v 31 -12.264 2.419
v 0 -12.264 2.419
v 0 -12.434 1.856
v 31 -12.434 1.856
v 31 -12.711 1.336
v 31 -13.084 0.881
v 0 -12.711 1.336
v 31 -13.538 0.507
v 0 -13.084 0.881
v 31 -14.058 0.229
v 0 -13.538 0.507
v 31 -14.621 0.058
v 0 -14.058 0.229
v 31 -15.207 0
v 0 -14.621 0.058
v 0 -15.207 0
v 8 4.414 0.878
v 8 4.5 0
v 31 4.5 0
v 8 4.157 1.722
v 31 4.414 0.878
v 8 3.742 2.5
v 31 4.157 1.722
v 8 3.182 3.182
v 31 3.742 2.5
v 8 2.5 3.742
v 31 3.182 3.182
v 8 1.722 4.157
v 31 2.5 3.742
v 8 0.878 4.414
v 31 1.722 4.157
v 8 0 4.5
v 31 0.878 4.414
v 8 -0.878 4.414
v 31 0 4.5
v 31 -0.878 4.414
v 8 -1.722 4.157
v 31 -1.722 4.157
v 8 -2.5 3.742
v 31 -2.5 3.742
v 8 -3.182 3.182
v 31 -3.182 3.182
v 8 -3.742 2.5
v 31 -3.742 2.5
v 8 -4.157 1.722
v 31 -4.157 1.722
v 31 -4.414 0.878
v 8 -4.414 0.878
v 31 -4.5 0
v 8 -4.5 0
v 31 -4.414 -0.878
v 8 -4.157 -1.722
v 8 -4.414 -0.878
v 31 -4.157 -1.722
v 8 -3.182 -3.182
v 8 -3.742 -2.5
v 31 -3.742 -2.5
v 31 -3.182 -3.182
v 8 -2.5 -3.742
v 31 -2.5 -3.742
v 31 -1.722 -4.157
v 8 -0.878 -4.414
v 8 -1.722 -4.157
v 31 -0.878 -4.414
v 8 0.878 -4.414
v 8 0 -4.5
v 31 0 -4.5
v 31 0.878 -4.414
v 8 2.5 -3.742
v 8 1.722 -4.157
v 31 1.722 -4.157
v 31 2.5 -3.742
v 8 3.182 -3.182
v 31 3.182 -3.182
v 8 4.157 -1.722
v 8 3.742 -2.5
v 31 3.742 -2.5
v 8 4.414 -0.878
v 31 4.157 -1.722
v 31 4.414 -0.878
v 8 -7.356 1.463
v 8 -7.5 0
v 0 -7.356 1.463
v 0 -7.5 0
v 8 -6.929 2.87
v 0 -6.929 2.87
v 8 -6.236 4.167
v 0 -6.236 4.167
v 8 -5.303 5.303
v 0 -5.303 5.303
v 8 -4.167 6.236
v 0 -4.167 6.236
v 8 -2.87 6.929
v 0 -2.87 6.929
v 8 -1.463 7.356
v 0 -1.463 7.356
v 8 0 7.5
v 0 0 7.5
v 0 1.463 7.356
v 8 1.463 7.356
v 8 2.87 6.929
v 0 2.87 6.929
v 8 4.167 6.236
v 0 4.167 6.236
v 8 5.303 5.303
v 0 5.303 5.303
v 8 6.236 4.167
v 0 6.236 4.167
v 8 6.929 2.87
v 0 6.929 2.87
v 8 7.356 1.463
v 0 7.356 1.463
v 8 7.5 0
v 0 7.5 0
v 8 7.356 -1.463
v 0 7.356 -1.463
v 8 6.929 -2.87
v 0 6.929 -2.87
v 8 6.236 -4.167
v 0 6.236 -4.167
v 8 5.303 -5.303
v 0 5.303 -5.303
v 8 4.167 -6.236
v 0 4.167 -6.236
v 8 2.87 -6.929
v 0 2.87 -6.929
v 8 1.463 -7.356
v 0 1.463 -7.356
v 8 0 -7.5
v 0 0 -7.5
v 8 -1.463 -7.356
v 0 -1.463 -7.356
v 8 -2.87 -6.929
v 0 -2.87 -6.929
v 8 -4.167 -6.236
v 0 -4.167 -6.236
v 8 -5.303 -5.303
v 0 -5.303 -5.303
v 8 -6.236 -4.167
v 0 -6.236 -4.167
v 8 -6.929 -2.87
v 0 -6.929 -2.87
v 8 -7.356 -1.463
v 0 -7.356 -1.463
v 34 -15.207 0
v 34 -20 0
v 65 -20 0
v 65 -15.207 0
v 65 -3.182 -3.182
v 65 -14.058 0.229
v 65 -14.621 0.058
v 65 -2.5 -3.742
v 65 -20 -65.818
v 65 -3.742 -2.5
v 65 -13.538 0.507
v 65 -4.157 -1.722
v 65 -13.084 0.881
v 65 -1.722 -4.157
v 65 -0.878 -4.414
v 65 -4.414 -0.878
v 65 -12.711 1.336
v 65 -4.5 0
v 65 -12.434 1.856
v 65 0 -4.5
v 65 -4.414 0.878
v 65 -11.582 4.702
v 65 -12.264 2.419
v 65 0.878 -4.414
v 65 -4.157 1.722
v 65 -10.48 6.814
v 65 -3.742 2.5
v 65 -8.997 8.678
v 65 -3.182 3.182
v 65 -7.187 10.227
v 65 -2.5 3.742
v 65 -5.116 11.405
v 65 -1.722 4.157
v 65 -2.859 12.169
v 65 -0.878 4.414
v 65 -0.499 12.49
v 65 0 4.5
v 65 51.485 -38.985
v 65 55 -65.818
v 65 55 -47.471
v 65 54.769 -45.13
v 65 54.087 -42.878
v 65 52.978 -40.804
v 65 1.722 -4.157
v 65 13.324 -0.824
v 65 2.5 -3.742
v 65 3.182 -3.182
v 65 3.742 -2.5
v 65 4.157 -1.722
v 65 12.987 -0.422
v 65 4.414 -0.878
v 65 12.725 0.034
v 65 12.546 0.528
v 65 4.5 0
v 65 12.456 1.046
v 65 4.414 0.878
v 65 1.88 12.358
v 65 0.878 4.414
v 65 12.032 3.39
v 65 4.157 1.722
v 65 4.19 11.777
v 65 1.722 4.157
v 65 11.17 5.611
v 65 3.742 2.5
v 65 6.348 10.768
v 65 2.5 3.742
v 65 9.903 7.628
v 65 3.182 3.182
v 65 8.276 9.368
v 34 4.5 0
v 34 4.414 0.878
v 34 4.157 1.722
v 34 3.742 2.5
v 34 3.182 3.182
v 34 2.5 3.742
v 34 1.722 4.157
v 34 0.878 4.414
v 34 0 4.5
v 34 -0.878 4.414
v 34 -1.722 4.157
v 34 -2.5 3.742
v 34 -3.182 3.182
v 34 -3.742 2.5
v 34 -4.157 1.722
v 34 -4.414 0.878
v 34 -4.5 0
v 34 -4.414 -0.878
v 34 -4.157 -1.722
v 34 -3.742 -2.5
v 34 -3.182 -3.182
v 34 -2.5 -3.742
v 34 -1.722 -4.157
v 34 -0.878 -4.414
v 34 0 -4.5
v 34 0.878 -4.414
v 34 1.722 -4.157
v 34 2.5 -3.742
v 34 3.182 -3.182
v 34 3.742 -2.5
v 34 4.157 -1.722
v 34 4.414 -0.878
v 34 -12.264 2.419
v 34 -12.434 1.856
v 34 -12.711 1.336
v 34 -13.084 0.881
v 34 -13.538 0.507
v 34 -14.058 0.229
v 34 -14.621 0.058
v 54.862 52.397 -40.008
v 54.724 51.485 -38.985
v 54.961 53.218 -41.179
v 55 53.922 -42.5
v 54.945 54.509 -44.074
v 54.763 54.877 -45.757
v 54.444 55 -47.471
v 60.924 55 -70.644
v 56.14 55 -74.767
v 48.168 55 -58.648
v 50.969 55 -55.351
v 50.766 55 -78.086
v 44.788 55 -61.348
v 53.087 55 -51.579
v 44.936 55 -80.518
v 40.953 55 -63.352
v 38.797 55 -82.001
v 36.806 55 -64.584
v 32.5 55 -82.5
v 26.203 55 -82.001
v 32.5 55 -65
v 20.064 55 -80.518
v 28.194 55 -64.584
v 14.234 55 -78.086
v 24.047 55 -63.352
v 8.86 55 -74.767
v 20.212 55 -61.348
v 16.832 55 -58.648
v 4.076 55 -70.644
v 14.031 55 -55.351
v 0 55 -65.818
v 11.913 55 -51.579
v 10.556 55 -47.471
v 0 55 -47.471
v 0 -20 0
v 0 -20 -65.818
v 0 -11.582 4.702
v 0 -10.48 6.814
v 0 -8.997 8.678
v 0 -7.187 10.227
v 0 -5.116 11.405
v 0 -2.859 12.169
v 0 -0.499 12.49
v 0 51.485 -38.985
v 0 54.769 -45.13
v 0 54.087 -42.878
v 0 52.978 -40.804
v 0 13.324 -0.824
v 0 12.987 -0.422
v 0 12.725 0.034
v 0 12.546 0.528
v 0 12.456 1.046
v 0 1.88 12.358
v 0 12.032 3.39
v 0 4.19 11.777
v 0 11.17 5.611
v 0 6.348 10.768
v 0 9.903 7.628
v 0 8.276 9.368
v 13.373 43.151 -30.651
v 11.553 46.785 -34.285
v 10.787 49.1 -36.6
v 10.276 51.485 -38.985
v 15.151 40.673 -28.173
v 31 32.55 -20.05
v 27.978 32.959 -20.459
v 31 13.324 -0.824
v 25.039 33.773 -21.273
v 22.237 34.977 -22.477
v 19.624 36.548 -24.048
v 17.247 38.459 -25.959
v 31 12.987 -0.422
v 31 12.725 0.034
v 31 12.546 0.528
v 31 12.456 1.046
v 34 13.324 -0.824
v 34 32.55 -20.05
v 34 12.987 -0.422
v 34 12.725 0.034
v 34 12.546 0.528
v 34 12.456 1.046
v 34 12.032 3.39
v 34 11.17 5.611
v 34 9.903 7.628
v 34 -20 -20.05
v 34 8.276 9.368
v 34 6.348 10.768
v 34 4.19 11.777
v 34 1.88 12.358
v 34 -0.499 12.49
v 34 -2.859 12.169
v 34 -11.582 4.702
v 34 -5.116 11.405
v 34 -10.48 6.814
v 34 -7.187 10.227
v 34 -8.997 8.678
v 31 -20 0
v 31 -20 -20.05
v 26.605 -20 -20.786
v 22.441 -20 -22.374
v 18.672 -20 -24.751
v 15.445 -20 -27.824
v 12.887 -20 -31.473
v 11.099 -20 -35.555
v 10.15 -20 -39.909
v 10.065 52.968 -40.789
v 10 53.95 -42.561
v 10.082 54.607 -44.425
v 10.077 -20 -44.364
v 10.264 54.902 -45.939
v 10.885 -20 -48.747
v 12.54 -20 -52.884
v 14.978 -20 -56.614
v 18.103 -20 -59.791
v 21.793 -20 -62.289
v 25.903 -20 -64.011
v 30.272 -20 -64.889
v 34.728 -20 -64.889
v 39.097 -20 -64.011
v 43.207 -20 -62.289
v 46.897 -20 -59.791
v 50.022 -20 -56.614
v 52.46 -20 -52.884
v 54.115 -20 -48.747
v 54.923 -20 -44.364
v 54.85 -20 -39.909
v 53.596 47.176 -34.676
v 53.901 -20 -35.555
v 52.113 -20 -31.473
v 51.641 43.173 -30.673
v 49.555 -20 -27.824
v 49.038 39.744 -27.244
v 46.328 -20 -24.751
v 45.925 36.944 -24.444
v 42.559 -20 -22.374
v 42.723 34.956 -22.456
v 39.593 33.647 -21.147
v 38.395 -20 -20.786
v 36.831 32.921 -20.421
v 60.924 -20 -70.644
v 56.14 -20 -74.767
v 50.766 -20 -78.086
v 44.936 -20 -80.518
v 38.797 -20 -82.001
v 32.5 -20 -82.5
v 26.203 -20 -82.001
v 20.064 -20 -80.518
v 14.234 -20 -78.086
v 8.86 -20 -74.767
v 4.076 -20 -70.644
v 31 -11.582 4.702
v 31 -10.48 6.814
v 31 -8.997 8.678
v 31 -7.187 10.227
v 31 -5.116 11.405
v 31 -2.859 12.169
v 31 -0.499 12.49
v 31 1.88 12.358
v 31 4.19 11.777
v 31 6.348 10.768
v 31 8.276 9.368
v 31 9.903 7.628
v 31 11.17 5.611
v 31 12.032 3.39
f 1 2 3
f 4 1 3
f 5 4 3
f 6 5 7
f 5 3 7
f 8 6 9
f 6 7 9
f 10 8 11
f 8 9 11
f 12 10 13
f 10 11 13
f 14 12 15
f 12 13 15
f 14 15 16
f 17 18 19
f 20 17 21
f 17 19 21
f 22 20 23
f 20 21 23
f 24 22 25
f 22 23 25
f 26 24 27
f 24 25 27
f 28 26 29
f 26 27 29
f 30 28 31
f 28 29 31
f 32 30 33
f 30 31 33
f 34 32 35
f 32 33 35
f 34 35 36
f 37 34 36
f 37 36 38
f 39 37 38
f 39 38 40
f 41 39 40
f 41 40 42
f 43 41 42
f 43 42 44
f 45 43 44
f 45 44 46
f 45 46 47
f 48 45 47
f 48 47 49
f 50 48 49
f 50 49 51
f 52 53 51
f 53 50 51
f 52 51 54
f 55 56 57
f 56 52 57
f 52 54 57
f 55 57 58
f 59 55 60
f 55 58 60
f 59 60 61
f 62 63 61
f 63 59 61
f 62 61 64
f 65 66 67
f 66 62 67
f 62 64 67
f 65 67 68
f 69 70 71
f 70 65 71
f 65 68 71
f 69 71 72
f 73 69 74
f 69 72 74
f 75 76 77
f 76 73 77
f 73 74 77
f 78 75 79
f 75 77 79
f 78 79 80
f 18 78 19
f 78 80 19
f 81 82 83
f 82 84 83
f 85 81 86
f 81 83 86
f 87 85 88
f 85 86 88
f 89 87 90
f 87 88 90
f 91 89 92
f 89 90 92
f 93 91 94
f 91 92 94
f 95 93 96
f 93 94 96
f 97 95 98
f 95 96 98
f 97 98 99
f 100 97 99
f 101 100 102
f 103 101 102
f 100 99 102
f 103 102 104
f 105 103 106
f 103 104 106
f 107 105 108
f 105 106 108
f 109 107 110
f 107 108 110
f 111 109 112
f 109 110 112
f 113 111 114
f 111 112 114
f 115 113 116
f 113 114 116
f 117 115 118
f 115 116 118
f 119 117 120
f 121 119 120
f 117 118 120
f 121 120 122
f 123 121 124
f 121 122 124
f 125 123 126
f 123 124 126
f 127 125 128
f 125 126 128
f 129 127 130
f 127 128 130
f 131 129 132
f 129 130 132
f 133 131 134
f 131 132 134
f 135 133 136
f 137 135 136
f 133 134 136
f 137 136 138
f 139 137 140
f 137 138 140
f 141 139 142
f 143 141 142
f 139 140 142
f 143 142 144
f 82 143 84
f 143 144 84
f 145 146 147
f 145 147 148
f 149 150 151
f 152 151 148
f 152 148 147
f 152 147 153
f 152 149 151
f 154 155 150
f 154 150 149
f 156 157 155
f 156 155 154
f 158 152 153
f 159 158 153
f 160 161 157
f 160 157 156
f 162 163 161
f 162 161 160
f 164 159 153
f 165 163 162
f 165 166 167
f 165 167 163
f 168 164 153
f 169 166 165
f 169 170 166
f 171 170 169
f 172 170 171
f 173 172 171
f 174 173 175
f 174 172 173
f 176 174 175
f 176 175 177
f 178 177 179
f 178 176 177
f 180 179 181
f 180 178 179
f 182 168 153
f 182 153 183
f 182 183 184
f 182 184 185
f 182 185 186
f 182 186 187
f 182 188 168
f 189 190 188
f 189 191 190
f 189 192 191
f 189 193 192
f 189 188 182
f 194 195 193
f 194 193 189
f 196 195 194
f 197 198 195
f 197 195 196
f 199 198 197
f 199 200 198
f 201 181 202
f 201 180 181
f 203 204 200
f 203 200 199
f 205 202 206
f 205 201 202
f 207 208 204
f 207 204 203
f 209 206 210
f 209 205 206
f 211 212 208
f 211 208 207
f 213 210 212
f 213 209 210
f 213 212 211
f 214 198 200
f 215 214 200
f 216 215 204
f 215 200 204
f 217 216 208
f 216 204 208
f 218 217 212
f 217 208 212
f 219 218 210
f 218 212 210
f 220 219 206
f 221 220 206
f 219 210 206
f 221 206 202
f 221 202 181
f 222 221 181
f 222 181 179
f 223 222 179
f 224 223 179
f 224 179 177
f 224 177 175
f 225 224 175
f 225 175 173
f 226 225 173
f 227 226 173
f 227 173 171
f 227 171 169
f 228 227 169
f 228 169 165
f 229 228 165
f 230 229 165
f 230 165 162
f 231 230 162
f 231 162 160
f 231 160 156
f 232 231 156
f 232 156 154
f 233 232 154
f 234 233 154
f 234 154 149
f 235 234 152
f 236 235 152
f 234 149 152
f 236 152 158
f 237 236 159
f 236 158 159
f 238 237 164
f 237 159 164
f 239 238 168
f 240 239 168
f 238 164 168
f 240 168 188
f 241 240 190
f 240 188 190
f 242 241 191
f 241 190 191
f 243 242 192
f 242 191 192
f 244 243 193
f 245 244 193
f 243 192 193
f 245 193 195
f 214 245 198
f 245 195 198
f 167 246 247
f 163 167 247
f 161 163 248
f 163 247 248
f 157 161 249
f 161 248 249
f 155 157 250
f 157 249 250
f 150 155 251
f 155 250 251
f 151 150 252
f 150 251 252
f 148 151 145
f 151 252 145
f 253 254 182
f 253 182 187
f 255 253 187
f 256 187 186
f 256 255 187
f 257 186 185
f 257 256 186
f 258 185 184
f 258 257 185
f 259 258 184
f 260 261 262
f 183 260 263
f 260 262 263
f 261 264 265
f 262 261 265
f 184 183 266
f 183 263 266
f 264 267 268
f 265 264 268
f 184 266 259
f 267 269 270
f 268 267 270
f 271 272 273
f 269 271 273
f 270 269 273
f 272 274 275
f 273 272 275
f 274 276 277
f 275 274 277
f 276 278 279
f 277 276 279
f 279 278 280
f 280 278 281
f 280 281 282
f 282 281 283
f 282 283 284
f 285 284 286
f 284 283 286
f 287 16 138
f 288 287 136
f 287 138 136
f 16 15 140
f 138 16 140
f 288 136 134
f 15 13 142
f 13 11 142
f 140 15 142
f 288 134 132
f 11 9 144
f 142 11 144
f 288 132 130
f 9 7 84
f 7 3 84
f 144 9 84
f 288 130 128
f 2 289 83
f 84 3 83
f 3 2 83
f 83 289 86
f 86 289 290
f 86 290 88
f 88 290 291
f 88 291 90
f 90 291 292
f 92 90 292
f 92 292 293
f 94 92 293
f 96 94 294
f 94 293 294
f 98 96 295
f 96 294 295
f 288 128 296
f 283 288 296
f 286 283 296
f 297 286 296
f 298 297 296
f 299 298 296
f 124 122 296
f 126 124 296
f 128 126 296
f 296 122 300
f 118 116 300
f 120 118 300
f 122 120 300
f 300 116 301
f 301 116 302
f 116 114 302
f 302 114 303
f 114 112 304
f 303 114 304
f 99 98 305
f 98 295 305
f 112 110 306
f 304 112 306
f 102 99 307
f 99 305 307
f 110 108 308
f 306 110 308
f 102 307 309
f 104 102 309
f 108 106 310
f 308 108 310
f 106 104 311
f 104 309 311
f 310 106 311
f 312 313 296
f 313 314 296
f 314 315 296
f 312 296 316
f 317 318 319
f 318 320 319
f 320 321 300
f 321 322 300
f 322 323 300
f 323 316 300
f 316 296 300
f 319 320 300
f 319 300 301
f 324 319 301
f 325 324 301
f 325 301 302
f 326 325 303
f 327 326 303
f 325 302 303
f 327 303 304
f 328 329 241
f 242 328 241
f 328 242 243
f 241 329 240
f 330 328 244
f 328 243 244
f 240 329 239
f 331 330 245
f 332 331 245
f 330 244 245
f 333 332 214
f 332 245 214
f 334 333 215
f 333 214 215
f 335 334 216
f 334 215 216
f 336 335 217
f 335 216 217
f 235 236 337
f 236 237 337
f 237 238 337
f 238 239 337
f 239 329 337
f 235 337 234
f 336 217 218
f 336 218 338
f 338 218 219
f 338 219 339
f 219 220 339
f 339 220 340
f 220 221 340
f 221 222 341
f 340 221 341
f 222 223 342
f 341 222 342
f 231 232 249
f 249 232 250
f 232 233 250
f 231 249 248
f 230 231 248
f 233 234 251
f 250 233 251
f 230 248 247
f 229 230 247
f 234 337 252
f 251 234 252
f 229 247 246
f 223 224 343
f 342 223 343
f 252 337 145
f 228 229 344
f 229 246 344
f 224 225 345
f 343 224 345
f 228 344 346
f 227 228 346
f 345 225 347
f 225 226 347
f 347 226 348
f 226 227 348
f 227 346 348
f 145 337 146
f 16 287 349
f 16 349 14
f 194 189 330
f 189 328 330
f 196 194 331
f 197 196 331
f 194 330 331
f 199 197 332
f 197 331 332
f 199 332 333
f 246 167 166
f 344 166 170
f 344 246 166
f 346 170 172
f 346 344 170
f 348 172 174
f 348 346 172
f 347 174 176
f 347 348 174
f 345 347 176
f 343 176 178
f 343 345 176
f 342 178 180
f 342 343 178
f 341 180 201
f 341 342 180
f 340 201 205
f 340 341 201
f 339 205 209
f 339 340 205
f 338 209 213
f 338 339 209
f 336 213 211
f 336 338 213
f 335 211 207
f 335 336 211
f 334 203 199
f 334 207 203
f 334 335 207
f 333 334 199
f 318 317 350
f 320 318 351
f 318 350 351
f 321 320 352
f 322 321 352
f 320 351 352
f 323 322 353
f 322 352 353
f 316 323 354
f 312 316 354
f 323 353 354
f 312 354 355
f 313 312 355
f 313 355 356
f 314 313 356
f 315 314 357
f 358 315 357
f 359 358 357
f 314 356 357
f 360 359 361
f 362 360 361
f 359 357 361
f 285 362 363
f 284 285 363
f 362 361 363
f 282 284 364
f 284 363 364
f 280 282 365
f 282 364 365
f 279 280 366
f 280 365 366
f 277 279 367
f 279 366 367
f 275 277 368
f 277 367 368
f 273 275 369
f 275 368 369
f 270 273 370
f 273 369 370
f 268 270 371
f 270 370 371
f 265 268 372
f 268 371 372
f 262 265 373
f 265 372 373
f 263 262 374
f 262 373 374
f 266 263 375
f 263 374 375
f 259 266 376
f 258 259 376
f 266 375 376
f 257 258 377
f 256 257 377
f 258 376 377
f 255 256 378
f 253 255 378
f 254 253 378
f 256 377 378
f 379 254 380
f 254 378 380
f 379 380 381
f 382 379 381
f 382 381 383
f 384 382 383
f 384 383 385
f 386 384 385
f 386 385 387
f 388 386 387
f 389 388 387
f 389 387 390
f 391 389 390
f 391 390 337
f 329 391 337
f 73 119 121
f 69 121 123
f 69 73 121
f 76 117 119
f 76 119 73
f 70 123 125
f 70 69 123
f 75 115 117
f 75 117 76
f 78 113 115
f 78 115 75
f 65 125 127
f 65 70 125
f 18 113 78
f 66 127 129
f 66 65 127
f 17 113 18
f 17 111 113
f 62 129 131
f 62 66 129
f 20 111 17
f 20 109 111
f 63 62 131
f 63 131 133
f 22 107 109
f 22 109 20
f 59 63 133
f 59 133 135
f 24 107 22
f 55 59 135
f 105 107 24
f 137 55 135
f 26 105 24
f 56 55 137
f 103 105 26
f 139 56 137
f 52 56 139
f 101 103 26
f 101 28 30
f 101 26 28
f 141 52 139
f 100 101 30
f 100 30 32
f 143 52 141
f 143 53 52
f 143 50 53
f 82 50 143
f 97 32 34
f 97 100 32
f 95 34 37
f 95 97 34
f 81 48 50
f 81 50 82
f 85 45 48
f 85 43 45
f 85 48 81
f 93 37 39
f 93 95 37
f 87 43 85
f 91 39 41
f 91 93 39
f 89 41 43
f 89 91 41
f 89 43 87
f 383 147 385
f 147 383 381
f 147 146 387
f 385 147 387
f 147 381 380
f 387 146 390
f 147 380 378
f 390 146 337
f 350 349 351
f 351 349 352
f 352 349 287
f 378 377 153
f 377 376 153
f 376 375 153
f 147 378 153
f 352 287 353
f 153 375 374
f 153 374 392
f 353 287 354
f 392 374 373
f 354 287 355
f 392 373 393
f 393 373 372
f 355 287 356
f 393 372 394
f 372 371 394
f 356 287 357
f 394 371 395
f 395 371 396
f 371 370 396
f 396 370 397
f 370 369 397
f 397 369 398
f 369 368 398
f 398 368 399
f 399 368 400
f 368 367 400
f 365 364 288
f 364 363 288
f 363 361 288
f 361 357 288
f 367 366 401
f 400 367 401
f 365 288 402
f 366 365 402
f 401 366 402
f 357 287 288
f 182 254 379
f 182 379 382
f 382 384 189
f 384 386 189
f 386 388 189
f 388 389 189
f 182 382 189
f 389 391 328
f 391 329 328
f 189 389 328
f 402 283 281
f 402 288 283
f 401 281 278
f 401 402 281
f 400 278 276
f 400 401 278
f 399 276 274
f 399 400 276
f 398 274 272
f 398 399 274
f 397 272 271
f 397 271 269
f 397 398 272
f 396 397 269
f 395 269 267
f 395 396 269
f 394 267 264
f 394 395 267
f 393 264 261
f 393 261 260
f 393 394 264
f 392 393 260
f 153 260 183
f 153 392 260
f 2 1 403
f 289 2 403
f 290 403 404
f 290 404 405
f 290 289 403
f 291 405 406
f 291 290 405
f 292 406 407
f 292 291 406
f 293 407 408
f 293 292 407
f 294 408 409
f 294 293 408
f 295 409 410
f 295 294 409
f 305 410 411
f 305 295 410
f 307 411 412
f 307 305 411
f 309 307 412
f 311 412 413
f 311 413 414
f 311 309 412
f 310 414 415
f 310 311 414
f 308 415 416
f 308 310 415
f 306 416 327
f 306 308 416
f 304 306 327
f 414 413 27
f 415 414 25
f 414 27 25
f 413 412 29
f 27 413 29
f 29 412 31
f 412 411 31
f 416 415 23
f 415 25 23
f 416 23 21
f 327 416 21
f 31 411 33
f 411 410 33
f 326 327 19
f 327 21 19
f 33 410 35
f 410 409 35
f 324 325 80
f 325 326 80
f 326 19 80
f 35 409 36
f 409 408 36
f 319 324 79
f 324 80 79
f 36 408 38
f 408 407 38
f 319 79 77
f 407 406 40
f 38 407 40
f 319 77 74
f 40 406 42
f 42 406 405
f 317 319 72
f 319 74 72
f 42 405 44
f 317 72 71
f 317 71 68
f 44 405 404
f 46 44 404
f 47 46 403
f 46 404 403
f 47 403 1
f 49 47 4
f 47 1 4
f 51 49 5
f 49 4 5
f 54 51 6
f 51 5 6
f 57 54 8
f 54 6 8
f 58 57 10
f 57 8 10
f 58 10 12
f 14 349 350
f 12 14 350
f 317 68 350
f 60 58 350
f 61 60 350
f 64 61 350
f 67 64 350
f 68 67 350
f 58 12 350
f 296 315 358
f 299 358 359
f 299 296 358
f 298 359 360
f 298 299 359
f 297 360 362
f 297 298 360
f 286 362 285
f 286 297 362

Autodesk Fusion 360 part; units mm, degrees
sketch "Sketch1" plane through (0, 0, 0) normal (1, 0, 0) x (0, 1, 0)
  line L0 (-70, 0) -> (110, 0)
  line L1 (0, 110) -> (0, -170)
  line L2 (-15.2069, 0) -> (-20, 0)
  line L3 (-20, 0) -> (-20, -82.5)
  line L4 (-20, -82.5) -> (55, -82.5)
  line L5 (55, -82.5) -> (55, -47.4706)
  line L6 (51.4853, -38.9853) -> (13.3243, -0.8243)
  line L7 (55, -42.5) -> (115.1063, -42.5) construction
  arc A0 (12.4562, 1.046) -> (-12.2636, 2.4194) centre (0, 0) ccw
  arc A1 (-15.2069, 0) -> (-12.2636, 2.4194) centre (-15.2069, 3) ccw
  arc A2 (12.4562, 1.046) -> (13.3243, -0.8243) centre (15.4456, 1.297) ccw
  arc A3 (55, -47.4706) -> (51.4853, -38.9853) centre (43, -47.4706) ccw
  point P0 (-12.5, 0)
  dimension "d2" = 7.5
  dimension "d3" = 82.5
  dimension "d4" = 75
  dimension "d5" = 40
  dimension "d6" = 135
  dimension "d7" = 12.5
  dimension "d8" = 3
  dimension "d9" = 3
  dimension "d10" = 12
extrude "Extrude1" add sketch "Sketch1" along normal blind 65
sketch "Sketch2" plane through (65, 0, 0) normal (1, 0, 0) x (0, 1, 0)
  line L0 (-15.2069, 0) -> (-20, 0)
  line L1 (-20, 0) -> (-20, -82.5)
  line L2 (-20, -82.5) -> (55, -82.5)
  line L3 (55, -82.5) -> (55, -47.4706)
  arc A0 (55, -47.4706) -> (51.4853, -38.9853) centre (43, -47.4706) ccw
  line L4 (51.4853, -38.9853) -> (13.3243, -0.8243)
  arc A1 (12.4562, 1.046) -> (13.3243, -0.8243) centre (15.4456, 1.297) ccw
  arc A2 (12.4562, 1.046) -> (-12.2636, 2.4194) centre (0, 0) ccw
  arc A3 (-15.2069, 0) -> (-12.2636, 2.4194) centre (-15.2069, 3) ccw
sketch "Sketch3" plane through (0, -20, 0) normal (0, -1, 0) x (1, 0, 0)
  line L0 (0, 0) -> (0, -82.5)
  line L1 (0, -82.5) -> (65, -82.5)
  line L2 (65, -82.5) -> (65, 0)
  line L3 (65, 0) -> (0, 0)
  line L4 (0, 0) -> (32.5, 0)
  line L5 (32.5, 0) -> (32.5, -42.5)
  circle A0 centre (32.5, -42.5) radius 22.5
  dimension "d13" = 42.5
  dimension "d14" = 45
extrude "Extrude2" cut sketch "Sketch3" against normal blind 110 contours A0
sketch "Sketch4" plane through (0, -20, 0) normal (0, -1, 0) x (1, 0, 0)
  circle A0 centre (32.5, -42.5) radius 22.5
  line L0 (0, 0) -> (0, -82.5)
  line L1 (0, -82.5) -> (65, -82.5)
  line L2 (65, -82.5) -> (65, 0)
  line L3 (65, 0) -> (0, 0)
  circle A1 centre (32.5, -42.5) radius 40
  dimension "d17" = 80
extrude "Extrude3" cut sketch "Sketch4" against normal blind 110 contours L0 L1 A1 | L1 L2 A1
sketch "Sketch5" plane through (0, 0, 0) normal (0, 1, 0) x (1, 0, 0)
sketch "Sketch6" plane through (65, 0, 0) normal (1, 0, 0) x (0, 1, 0)
  circle A0 centre (0, 0) radius 4.5
  dimension "d23" = 9
extrude "Extrude4" cut sketch "Sketch6" against normal blind 120
sketch "Sketch7" plane through (65, 17.5, -34.7081) normal (1, 0, 0) x (0, 1, 0)
sketch "Sketch8" plane through (0, 0, 0) normal (-1, 0, 0) x (0, -1, 0)
  circle A0 centre (0, 0) radius 4.5
  line L0 (-55, -65.8184) -> (20, -65.8184)
  line L1 (20, -65.8184) -> (20, 0)
  line L2 (20, 0) -> (15.2069, 0)
  arc A1 (12.2636, 2.4194) -> (15.2069, 0) centre (15.2069, 3) ccw
  arc A2 (12.2636, 2.4194) -> (-12.4562, 1.046) centre (0, 0) ccw
  arc A3 (-13.3243, -0.8243) -> (-12.4562, 1.046) centre (-15.4456, 1.297) ccw
  line L3 (-13.3243, -0.8243) -> (-51.4853, -38.9853)
  arc A4 (-51.4853, -38.9853) -> (-55, -47.4706) centre (-43, -47.4706) ccw
  line L4 (-55, -47.4706) -> (-55, -65.8184)
  circle A5 centre (0, 0) radius 7.5
  dimension "d26" = 15
extrude "Extrude5" cut sketch "Sketch8" against normal blind 8 contours A5
sketch "Sketch9" plane through (0, -20, 0) normal (0, -1, 0) x (1, 0, 0)
  circle A0 centre (32.5, -42.5) radius 22.5
  arc A1 (0, -65.8184) -> (65, -65.8184) centre (32.5, -42.5) ccw
  line L0 (65, -65.8184) -> (65, 0)
  line L1 (65, 0) -> (0, 0)
  line L2 (0, 0) -> (0, -65.8184)
  line L3 (31, -42.5) -> (34, -42.5)
  line L4 (34, -42.5) -> (34, 31.8842)
  line L5 (34, 31.8842) -> (31, 31.8842)
  line L6 (31, 31.8842) -> (31, -42.5)
  dimension "d30" = 3
extrude "Extrude6" cut sketch "Sketch9" against normal blind 130 contours A0 L3 L4 L6 | A0 L1 L4 L6 | L1 L4 L5 L6 picked at (31.959, -57.4579)
